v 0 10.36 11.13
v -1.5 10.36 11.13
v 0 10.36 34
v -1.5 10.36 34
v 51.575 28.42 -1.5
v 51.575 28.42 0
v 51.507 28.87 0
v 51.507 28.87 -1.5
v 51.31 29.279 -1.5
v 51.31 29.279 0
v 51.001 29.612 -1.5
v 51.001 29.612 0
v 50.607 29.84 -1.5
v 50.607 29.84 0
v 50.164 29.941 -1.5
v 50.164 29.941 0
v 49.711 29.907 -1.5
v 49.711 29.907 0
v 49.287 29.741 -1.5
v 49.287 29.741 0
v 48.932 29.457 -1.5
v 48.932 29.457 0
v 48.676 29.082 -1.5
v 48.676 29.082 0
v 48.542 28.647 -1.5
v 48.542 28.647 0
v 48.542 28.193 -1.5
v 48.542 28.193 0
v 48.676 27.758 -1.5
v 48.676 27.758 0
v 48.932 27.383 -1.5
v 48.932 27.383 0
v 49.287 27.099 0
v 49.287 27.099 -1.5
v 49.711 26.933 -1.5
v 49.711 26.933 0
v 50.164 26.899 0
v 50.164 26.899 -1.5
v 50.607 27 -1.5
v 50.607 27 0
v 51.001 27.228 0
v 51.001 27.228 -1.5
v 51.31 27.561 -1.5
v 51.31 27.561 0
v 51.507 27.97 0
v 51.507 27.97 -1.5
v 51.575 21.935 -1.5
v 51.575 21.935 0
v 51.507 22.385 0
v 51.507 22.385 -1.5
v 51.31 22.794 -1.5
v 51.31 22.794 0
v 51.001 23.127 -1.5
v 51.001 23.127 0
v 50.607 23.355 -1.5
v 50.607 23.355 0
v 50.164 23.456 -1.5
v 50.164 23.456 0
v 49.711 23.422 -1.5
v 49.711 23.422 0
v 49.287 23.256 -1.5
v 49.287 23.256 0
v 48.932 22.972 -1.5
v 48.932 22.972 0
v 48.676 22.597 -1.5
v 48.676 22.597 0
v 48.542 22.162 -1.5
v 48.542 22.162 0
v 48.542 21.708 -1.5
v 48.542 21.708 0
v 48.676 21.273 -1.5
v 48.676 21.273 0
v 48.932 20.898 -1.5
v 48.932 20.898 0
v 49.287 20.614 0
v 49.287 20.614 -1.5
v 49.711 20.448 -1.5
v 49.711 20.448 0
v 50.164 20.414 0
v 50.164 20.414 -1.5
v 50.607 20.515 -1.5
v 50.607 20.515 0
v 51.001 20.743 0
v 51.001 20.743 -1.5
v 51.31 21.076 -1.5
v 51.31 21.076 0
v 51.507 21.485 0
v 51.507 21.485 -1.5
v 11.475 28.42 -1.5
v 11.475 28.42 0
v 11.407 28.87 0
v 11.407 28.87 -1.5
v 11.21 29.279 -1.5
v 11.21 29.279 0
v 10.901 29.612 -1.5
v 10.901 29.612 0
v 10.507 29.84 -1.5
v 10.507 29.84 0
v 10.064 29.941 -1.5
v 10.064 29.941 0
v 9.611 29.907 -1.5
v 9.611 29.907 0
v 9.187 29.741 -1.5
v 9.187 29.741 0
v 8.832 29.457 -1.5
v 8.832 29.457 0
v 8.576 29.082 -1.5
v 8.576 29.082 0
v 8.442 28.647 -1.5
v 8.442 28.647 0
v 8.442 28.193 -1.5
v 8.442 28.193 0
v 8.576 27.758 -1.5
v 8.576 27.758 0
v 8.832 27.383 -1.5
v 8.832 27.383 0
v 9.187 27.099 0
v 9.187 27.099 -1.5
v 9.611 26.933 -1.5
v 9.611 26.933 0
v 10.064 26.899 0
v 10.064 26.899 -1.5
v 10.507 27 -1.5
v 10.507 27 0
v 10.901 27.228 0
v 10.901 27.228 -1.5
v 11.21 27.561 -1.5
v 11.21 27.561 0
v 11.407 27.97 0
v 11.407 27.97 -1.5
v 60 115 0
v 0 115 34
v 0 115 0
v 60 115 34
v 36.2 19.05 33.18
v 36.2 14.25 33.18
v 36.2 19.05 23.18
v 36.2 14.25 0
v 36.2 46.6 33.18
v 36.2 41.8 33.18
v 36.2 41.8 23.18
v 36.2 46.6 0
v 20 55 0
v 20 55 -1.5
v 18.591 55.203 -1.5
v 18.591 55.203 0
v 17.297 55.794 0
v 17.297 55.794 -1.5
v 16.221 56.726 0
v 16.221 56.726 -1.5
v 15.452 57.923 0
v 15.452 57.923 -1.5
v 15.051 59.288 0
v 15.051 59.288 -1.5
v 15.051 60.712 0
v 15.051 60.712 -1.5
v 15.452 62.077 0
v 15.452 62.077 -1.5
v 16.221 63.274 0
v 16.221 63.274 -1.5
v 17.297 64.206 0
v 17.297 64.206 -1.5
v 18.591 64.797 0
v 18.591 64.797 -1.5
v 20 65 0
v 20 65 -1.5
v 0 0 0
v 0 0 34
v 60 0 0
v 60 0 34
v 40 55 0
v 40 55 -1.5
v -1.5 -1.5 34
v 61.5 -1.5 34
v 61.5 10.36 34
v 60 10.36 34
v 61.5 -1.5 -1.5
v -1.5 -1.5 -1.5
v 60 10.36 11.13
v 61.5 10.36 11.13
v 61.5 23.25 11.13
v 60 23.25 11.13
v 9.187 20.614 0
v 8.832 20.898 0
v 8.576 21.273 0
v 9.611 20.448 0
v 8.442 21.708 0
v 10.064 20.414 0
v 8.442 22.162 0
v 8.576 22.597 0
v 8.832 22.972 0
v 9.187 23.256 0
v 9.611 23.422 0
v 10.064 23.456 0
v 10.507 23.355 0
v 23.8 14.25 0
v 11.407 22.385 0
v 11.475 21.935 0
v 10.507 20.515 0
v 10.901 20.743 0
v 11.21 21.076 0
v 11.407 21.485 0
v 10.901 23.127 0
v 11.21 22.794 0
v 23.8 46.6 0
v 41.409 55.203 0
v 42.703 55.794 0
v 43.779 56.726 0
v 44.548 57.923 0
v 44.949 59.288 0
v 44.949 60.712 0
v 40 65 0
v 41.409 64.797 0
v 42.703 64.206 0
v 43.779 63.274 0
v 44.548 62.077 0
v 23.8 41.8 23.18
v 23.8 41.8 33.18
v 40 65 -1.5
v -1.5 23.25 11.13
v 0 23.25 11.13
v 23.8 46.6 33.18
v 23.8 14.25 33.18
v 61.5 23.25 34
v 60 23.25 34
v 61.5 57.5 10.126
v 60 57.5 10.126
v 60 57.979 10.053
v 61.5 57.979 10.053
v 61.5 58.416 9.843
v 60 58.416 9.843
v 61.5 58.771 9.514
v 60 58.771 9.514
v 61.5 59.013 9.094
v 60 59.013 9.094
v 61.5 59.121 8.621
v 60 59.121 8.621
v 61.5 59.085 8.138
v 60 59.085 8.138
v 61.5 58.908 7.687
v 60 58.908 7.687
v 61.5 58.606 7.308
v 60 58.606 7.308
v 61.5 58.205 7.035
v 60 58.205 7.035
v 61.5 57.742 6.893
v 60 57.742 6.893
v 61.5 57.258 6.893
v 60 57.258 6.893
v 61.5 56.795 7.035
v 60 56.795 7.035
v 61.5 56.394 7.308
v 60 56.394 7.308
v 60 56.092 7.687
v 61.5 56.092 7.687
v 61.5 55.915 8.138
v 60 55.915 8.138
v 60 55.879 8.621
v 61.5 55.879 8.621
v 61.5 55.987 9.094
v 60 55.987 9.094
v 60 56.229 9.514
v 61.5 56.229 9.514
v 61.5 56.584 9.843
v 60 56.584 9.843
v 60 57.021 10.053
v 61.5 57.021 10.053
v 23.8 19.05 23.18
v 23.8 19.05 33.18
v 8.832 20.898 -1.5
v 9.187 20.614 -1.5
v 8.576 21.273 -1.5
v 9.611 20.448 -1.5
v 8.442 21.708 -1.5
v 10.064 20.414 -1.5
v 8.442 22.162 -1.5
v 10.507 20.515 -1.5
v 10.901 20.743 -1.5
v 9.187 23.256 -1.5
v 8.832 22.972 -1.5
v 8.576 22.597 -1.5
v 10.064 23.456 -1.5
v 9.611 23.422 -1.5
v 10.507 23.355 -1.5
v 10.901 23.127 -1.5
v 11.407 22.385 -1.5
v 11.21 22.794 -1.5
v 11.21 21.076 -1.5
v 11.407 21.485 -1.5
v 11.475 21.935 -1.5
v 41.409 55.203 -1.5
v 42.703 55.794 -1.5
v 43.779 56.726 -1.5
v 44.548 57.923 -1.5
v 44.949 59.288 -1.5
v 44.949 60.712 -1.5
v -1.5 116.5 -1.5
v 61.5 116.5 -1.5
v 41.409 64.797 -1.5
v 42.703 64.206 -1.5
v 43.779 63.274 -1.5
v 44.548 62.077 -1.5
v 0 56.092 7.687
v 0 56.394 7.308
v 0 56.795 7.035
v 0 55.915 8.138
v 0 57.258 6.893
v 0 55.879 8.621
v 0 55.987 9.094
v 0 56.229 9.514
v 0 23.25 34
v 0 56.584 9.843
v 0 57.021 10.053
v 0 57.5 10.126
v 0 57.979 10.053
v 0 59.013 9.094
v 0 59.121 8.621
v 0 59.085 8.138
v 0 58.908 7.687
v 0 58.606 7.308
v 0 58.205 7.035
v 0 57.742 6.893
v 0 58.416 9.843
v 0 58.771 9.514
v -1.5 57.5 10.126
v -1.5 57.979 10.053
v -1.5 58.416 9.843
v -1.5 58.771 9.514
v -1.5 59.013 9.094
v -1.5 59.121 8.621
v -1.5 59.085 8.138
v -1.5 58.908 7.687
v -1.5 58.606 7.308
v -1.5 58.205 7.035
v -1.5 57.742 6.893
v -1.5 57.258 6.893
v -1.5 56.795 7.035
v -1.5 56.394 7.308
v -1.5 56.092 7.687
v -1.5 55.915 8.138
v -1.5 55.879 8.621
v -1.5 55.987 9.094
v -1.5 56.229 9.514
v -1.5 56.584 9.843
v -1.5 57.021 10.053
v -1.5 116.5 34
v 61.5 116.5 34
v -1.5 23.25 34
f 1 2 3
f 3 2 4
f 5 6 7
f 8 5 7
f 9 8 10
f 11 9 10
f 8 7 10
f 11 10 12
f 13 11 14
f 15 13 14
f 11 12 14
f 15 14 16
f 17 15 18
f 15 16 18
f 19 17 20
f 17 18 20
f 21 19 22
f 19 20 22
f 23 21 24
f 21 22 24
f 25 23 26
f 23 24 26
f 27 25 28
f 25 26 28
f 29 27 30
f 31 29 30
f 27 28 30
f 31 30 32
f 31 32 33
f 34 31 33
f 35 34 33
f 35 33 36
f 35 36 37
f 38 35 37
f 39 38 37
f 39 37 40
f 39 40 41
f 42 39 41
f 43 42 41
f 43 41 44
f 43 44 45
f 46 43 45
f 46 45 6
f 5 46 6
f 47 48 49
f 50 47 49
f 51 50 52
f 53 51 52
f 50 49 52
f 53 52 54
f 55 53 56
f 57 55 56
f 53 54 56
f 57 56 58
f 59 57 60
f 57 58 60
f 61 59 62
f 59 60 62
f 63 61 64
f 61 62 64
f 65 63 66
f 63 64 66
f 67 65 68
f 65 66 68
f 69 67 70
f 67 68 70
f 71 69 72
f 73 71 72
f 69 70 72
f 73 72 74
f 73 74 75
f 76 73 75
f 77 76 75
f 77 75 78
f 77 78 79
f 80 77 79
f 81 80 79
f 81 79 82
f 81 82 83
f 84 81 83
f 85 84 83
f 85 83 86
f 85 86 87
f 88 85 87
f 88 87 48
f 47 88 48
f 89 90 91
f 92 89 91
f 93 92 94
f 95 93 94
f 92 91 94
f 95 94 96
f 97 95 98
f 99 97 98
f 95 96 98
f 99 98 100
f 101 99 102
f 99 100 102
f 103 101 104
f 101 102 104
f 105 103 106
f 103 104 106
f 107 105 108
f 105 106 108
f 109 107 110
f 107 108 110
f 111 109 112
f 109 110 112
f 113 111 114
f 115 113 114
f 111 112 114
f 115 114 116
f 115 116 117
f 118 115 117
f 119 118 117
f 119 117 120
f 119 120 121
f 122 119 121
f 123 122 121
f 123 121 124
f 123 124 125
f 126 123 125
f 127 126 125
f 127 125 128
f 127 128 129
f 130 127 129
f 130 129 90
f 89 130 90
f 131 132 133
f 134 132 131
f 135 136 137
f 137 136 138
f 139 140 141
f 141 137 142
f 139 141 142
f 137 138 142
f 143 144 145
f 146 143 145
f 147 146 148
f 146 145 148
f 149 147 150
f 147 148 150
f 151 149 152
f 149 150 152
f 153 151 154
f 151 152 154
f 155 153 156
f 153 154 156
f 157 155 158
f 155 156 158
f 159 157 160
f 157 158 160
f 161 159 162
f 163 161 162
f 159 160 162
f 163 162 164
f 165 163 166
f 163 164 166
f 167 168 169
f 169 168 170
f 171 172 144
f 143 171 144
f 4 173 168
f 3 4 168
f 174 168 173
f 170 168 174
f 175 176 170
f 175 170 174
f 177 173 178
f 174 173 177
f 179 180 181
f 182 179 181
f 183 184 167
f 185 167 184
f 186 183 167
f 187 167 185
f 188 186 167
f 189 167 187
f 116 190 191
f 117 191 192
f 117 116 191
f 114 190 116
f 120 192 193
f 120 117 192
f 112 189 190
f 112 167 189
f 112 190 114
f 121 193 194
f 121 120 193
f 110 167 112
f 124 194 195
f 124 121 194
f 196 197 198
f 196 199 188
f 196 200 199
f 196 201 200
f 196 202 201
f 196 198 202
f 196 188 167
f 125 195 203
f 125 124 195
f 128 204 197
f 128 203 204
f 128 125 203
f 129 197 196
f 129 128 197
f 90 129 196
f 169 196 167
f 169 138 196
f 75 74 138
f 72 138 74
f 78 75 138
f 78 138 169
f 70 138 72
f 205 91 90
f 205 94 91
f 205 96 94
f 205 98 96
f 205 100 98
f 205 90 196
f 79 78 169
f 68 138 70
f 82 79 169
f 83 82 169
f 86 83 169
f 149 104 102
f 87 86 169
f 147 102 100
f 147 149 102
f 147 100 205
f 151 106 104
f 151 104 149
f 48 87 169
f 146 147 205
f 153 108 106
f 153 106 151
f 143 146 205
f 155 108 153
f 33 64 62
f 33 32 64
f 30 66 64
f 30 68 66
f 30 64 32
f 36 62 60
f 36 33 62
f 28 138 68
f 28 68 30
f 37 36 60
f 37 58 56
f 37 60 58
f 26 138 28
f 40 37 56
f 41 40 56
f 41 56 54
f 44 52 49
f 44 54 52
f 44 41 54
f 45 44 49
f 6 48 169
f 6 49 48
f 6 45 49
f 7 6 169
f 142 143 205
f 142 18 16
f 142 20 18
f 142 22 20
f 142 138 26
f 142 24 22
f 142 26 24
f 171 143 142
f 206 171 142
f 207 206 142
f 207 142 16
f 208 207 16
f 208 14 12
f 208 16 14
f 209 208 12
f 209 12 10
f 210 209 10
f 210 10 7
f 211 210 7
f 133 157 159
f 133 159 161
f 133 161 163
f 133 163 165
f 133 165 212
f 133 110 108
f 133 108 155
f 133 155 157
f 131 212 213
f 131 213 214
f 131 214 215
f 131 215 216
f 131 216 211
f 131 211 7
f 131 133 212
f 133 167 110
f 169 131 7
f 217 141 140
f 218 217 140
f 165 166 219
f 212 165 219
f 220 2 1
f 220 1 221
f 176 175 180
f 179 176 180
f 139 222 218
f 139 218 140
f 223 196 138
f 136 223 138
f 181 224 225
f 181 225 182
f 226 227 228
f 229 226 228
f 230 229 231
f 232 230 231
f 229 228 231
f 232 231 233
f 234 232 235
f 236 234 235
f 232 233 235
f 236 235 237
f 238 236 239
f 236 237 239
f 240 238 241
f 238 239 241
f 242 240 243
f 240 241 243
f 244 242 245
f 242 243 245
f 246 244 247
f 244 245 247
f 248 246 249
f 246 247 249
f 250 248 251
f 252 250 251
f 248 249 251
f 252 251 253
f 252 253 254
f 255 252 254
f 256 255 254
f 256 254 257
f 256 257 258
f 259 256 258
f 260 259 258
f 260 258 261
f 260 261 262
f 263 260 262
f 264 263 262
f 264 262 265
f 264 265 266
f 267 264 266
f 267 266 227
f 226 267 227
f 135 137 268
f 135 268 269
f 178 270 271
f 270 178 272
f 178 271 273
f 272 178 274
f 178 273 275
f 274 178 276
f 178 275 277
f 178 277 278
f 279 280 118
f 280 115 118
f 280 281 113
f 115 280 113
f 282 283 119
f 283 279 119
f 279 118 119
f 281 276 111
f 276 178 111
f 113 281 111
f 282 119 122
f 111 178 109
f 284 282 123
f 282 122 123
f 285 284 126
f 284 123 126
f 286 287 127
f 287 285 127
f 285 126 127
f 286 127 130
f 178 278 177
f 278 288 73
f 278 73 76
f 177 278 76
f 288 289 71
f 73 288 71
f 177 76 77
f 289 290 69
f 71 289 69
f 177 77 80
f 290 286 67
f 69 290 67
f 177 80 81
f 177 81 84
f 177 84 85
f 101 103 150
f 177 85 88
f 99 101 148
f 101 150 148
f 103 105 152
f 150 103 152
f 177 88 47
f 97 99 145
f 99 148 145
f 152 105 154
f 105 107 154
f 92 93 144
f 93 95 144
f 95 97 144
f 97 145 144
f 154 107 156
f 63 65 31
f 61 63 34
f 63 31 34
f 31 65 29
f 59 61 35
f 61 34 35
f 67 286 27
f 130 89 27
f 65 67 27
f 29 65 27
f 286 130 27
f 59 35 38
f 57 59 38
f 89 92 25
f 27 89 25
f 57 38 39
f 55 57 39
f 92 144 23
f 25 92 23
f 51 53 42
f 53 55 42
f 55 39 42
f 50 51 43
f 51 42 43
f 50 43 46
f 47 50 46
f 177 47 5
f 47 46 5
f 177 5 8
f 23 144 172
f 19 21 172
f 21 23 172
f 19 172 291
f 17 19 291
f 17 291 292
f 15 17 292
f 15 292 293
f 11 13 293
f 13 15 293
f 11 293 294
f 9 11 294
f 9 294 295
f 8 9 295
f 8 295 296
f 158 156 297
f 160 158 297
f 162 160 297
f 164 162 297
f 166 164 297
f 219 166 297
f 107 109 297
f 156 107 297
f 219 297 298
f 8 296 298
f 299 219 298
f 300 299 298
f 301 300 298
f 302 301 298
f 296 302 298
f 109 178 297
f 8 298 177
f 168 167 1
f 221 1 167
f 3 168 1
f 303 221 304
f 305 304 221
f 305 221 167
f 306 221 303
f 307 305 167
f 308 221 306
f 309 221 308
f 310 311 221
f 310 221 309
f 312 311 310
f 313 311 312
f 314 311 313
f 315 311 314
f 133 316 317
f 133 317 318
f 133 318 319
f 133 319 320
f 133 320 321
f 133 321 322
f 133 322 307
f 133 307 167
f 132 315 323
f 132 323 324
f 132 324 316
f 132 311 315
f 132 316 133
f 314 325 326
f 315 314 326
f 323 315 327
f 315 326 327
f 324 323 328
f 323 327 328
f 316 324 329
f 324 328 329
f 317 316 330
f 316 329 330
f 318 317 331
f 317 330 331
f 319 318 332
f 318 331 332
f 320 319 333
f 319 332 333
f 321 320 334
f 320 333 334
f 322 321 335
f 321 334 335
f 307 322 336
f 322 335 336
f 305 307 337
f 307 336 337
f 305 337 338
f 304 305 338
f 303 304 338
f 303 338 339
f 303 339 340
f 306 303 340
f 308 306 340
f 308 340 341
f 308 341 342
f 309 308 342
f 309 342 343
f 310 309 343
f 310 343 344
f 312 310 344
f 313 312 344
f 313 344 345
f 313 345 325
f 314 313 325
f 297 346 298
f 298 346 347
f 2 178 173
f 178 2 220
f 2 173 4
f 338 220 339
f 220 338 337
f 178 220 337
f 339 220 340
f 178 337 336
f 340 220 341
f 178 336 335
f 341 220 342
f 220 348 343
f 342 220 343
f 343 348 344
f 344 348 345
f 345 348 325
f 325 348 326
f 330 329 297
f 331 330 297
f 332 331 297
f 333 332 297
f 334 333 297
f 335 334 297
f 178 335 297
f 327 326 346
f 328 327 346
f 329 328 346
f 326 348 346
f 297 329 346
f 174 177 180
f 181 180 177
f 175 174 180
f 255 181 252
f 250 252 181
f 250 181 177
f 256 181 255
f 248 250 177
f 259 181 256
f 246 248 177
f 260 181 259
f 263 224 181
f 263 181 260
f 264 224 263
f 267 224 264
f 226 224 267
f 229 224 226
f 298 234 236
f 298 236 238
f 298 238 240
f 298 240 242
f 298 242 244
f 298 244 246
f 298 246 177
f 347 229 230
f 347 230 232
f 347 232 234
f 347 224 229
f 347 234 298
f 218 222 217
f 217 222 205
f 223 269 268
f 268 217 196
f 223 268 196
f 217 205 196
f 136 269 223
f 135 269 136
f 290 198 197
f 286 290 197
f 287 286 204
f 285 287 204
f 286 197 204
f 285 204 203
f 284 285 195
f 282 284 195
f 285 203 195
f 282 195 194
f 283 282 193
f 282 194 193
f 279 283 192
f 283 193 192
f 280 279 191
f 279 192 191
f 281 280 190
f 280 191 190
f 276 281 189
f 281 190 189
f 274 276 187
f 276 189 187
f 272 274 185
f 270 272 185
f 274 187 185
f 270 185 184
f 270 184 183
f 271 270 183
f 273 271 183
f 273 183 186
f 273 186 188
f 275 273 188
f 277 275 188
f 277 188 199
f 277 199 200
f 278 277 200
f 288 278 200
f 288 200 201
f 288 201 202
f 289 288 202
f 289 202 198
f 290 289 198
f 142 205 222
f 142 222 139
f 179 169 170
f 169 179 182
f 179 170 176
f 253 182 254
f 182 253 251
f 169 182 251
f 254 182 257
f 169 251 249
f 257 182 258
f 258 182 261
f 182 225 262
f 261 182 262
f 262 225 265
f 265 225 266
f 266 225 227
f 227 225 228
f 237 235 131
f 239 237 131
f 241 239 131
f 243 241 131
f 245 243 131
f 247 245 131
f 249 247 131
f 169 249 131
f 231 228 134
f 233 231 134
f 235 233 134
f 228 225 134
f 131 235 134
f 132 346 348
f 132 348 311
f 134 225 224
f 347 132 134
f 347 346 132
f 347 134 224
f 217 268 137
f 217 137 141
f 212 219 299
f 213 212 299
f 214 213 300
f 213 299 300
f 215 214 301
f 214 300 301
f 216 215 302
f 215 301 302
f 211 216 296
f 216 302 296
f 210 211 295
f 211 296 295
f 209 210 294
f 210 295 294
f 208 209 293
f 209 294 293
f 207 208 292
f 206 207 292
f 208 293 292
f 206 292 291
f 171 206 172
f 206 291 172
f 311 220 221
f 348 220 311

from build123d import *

# Parameters (mm, degrees)
SKETCH1_W                  = 63
SKETCH1_H                  = 118
BOSS_EXTRUDE1_DEPTH        = 35.5
SKETCH2_W                  = 60
SKETCH2_H                  = 115
CUT_EXTRUDE1_DEPTH         = 34
SKETCH3_W                  = 12.4
SKETCH3_H                  = 3.3
SKETCH3_H_2                = 1.5
SKETCH3_H_3                = 22.75
BOSS_EXTRUDE2_DEPTH        = 33.18
CUT_EXTRUDE2_REACH         = 129.081
SKETCH4_W                  = 10
SKETCH4_H                  = 22.75
CUT_EXTRUDE3_REACH         = 138.738
SKETCH5_W                  = 22.87
SKETCH5_H                  = 12.89
CUT_EXTRUDE4_REACH         = 138.738
SKETCH6_W                  = 22.87
SKETCH6_H                  = 12.89
CUT_EXTRUDE5_DEPTH         = 137.435882377
M2_5_CLEARANCE_HOLE1_D     = 3.05
M2_5_CLEARANCE_HOLE1_DEPTH = 35.5
M3_CLEARANCE_HOLE1_D       = 3.2512
M3_CLEARANCE_HOLE1_DEPTH   = 1.5
M3_CLEARANCE_HOLE2_D       = 3.2512
M3_CLEARANCE_HOLE2_DEPTH   = 63


with BuildPart() as part:
    # Sketch1 → Boss-Extrude1 (new body)
    with BuildSketch(Plane.XY.offset(34)):
        with Locations((30, 57.5)):
            Rectangle(SKETCH1_W, SKETCH1_H)
    extrude(amount=-BOSS_EXTRUDE1_DEPTH)

    # Sketch2 → Cut-Extrude1 (cut)
    with BuildSketch(Plane.XY.offset(34)):
        with Locations((30, 57.5)):
            Rectangle(SKETCH2_W, SKETCH2_H)
    extrude(amount=-CUT_EXTRUDE1_DEPTH, mode=Mode.SUBTRACT)

    # Sketch3 → Boss-Extrude2 (add)
    with BuildSketch(Plane.XY):
        with Locations((30, 15.9)):
            Rectangle(SKETCH3_W, SKETCH3_H)
        with Locations((30, 18.3)):
            Rectangle(SKETCH3_W, SKETCH3_H_2)
        with Locations((30, 30.425)):
            Rectangle(SKETCH3_W, SKETCH3_H_3)
        with Locations((30, 44.95)):
            Rectangle(SKETCH3_W, SKETCH3_H)
        with Locations((30, 42.55)):
            Rectangle(SKETCH3_W, SKETCH3_H_2)
    extrude(amount=BOSS_EXTRUDE2_DEPTH)

    # Sketch4 → Cut-Extrude2 (cut, up to next)
    with BuildSketch(Plane.ZY.offset(-23.8), mode=Mode.PRIVATE) as cut_extrude2_sk1:
        with Locations((28.18, 30.425)):
            Rectangle(SKETCH4_W, SKETCH4_H)
    cut_extrude2_tool1 = extrude(cut_extrude2_sk1.sketch, amount=-CUT_EXTRUDE2_REACH, mode=Mode.PRIVATE) & part.part
    add(cut_extrude2_tool1.solids().sort_by_distance((23.8, 30.425, 28.18))[0], mode=Mode.SUBTRACT)

    # Sketch5 → Cut-Extrude3 (cut, up to next)
    with BuildSketch(Plane(origin=(61.5, 0, 0), x_dir=(0, 0, -1), z_dir=(1, 0, 0)), mode=Mode.PRIVATE) as cut_extrude3_sk1:
        with Locations((-22.565, 16.805)):
            Rectangle(SKETCH5_W, SKETCH5_H)
    cut_extrude3_tool1 = extrude(cut_extrude3_sk1.sketch, amount=-CUT_EXTRUDE3_REACH, mode=Mode.PRIVATE) & part.part
    add(cut_extrude3_tool1.solids().sort_by_distance((61.5, 16.805, 22.565))[0], mode=Mode.SUBTRACT)

    # Sketch6 → Cut-Extrude4 (cut, up to next)
    with BuildSketch(Plane.ZY.offset(1.5), mode=Mode.PRIVATE) as cut_extrude4_sk1:
        with Locations((22.565, 16.805)):
            Rectangle(SKETCH6_W, SKETCH6_H)
    cut_extrude4_tool1 = extrude(cut_extrude4_sk1.sketch, amount=-CUT_EXTRUDE4_REACH, mode=Mode.PRIVATE) & part.part
    add(cut_extrude4_tool1.solids().sort_by_distance((-1.5, 16.805, 22.565))[0], mode=Mode.SUBTRACT)

    # Sketch7 → Cut-Extrude5 (cut, through all)
    with BuildSketch(Plane(origin=(0, 0, -1.5), x_dir=(-1, 0, 0), z_dir=(0, 0, -1))):
        with BuildLine():
            Line((-40, 55), (-20, 55))
            ThreePointArc((-20, 55), (-15, 60), (-20, 65))
            Line((-20, 65), (-40, 65))
            ThreePointArc((-40, 65), (-45, 60), (-40, 55))
        make_face()
    extrude(amount=-CUT_EXTRUDE5_DEPTH, mode=Mode.SUBTRACT)

    # M2.5 Clearance Hole1
    with Locations(Plane(origin=(0, 0, -1.5), x_dir=(-1, 0, 0), z_dir=(0, 0, -1))):
        with Locations((-9.95, 28.42), (-9.95, 21.935), (-50.05, 28.42), (-50.05, 21.935)):
            Hole(M2_5_CLEARANCE_HOLE1_D / 2, depth=M2_5_CLEARANCE_HOLE1_DEPTH)

    # M3 Clearance Hole1
    with Locations(Plane(origin=(0, 0, 0), x_dir=(0, 0, -1), z_dir=(1, 0, 0))):
        with Locations((-8.5, 57.5)):
            Hole(M3_CLEARANCE_HOLE1_D / 2, depth=M3_CLEARANCE_HOLE1_DEPTH)

    # M3 Clearance Hole2
    with Locations(Plane(origin=(61.5, 0, 0), x_dir=(0, 0, -1), z_dir=(1, 0, 0))):
        with Locations((-8.5, 57.5)):
            Hole(M3_CLEARANCE_HOLE2_D / 2, depth=M3_CLEARANCE_HOLE2_DEPTH)


solid = part.part
